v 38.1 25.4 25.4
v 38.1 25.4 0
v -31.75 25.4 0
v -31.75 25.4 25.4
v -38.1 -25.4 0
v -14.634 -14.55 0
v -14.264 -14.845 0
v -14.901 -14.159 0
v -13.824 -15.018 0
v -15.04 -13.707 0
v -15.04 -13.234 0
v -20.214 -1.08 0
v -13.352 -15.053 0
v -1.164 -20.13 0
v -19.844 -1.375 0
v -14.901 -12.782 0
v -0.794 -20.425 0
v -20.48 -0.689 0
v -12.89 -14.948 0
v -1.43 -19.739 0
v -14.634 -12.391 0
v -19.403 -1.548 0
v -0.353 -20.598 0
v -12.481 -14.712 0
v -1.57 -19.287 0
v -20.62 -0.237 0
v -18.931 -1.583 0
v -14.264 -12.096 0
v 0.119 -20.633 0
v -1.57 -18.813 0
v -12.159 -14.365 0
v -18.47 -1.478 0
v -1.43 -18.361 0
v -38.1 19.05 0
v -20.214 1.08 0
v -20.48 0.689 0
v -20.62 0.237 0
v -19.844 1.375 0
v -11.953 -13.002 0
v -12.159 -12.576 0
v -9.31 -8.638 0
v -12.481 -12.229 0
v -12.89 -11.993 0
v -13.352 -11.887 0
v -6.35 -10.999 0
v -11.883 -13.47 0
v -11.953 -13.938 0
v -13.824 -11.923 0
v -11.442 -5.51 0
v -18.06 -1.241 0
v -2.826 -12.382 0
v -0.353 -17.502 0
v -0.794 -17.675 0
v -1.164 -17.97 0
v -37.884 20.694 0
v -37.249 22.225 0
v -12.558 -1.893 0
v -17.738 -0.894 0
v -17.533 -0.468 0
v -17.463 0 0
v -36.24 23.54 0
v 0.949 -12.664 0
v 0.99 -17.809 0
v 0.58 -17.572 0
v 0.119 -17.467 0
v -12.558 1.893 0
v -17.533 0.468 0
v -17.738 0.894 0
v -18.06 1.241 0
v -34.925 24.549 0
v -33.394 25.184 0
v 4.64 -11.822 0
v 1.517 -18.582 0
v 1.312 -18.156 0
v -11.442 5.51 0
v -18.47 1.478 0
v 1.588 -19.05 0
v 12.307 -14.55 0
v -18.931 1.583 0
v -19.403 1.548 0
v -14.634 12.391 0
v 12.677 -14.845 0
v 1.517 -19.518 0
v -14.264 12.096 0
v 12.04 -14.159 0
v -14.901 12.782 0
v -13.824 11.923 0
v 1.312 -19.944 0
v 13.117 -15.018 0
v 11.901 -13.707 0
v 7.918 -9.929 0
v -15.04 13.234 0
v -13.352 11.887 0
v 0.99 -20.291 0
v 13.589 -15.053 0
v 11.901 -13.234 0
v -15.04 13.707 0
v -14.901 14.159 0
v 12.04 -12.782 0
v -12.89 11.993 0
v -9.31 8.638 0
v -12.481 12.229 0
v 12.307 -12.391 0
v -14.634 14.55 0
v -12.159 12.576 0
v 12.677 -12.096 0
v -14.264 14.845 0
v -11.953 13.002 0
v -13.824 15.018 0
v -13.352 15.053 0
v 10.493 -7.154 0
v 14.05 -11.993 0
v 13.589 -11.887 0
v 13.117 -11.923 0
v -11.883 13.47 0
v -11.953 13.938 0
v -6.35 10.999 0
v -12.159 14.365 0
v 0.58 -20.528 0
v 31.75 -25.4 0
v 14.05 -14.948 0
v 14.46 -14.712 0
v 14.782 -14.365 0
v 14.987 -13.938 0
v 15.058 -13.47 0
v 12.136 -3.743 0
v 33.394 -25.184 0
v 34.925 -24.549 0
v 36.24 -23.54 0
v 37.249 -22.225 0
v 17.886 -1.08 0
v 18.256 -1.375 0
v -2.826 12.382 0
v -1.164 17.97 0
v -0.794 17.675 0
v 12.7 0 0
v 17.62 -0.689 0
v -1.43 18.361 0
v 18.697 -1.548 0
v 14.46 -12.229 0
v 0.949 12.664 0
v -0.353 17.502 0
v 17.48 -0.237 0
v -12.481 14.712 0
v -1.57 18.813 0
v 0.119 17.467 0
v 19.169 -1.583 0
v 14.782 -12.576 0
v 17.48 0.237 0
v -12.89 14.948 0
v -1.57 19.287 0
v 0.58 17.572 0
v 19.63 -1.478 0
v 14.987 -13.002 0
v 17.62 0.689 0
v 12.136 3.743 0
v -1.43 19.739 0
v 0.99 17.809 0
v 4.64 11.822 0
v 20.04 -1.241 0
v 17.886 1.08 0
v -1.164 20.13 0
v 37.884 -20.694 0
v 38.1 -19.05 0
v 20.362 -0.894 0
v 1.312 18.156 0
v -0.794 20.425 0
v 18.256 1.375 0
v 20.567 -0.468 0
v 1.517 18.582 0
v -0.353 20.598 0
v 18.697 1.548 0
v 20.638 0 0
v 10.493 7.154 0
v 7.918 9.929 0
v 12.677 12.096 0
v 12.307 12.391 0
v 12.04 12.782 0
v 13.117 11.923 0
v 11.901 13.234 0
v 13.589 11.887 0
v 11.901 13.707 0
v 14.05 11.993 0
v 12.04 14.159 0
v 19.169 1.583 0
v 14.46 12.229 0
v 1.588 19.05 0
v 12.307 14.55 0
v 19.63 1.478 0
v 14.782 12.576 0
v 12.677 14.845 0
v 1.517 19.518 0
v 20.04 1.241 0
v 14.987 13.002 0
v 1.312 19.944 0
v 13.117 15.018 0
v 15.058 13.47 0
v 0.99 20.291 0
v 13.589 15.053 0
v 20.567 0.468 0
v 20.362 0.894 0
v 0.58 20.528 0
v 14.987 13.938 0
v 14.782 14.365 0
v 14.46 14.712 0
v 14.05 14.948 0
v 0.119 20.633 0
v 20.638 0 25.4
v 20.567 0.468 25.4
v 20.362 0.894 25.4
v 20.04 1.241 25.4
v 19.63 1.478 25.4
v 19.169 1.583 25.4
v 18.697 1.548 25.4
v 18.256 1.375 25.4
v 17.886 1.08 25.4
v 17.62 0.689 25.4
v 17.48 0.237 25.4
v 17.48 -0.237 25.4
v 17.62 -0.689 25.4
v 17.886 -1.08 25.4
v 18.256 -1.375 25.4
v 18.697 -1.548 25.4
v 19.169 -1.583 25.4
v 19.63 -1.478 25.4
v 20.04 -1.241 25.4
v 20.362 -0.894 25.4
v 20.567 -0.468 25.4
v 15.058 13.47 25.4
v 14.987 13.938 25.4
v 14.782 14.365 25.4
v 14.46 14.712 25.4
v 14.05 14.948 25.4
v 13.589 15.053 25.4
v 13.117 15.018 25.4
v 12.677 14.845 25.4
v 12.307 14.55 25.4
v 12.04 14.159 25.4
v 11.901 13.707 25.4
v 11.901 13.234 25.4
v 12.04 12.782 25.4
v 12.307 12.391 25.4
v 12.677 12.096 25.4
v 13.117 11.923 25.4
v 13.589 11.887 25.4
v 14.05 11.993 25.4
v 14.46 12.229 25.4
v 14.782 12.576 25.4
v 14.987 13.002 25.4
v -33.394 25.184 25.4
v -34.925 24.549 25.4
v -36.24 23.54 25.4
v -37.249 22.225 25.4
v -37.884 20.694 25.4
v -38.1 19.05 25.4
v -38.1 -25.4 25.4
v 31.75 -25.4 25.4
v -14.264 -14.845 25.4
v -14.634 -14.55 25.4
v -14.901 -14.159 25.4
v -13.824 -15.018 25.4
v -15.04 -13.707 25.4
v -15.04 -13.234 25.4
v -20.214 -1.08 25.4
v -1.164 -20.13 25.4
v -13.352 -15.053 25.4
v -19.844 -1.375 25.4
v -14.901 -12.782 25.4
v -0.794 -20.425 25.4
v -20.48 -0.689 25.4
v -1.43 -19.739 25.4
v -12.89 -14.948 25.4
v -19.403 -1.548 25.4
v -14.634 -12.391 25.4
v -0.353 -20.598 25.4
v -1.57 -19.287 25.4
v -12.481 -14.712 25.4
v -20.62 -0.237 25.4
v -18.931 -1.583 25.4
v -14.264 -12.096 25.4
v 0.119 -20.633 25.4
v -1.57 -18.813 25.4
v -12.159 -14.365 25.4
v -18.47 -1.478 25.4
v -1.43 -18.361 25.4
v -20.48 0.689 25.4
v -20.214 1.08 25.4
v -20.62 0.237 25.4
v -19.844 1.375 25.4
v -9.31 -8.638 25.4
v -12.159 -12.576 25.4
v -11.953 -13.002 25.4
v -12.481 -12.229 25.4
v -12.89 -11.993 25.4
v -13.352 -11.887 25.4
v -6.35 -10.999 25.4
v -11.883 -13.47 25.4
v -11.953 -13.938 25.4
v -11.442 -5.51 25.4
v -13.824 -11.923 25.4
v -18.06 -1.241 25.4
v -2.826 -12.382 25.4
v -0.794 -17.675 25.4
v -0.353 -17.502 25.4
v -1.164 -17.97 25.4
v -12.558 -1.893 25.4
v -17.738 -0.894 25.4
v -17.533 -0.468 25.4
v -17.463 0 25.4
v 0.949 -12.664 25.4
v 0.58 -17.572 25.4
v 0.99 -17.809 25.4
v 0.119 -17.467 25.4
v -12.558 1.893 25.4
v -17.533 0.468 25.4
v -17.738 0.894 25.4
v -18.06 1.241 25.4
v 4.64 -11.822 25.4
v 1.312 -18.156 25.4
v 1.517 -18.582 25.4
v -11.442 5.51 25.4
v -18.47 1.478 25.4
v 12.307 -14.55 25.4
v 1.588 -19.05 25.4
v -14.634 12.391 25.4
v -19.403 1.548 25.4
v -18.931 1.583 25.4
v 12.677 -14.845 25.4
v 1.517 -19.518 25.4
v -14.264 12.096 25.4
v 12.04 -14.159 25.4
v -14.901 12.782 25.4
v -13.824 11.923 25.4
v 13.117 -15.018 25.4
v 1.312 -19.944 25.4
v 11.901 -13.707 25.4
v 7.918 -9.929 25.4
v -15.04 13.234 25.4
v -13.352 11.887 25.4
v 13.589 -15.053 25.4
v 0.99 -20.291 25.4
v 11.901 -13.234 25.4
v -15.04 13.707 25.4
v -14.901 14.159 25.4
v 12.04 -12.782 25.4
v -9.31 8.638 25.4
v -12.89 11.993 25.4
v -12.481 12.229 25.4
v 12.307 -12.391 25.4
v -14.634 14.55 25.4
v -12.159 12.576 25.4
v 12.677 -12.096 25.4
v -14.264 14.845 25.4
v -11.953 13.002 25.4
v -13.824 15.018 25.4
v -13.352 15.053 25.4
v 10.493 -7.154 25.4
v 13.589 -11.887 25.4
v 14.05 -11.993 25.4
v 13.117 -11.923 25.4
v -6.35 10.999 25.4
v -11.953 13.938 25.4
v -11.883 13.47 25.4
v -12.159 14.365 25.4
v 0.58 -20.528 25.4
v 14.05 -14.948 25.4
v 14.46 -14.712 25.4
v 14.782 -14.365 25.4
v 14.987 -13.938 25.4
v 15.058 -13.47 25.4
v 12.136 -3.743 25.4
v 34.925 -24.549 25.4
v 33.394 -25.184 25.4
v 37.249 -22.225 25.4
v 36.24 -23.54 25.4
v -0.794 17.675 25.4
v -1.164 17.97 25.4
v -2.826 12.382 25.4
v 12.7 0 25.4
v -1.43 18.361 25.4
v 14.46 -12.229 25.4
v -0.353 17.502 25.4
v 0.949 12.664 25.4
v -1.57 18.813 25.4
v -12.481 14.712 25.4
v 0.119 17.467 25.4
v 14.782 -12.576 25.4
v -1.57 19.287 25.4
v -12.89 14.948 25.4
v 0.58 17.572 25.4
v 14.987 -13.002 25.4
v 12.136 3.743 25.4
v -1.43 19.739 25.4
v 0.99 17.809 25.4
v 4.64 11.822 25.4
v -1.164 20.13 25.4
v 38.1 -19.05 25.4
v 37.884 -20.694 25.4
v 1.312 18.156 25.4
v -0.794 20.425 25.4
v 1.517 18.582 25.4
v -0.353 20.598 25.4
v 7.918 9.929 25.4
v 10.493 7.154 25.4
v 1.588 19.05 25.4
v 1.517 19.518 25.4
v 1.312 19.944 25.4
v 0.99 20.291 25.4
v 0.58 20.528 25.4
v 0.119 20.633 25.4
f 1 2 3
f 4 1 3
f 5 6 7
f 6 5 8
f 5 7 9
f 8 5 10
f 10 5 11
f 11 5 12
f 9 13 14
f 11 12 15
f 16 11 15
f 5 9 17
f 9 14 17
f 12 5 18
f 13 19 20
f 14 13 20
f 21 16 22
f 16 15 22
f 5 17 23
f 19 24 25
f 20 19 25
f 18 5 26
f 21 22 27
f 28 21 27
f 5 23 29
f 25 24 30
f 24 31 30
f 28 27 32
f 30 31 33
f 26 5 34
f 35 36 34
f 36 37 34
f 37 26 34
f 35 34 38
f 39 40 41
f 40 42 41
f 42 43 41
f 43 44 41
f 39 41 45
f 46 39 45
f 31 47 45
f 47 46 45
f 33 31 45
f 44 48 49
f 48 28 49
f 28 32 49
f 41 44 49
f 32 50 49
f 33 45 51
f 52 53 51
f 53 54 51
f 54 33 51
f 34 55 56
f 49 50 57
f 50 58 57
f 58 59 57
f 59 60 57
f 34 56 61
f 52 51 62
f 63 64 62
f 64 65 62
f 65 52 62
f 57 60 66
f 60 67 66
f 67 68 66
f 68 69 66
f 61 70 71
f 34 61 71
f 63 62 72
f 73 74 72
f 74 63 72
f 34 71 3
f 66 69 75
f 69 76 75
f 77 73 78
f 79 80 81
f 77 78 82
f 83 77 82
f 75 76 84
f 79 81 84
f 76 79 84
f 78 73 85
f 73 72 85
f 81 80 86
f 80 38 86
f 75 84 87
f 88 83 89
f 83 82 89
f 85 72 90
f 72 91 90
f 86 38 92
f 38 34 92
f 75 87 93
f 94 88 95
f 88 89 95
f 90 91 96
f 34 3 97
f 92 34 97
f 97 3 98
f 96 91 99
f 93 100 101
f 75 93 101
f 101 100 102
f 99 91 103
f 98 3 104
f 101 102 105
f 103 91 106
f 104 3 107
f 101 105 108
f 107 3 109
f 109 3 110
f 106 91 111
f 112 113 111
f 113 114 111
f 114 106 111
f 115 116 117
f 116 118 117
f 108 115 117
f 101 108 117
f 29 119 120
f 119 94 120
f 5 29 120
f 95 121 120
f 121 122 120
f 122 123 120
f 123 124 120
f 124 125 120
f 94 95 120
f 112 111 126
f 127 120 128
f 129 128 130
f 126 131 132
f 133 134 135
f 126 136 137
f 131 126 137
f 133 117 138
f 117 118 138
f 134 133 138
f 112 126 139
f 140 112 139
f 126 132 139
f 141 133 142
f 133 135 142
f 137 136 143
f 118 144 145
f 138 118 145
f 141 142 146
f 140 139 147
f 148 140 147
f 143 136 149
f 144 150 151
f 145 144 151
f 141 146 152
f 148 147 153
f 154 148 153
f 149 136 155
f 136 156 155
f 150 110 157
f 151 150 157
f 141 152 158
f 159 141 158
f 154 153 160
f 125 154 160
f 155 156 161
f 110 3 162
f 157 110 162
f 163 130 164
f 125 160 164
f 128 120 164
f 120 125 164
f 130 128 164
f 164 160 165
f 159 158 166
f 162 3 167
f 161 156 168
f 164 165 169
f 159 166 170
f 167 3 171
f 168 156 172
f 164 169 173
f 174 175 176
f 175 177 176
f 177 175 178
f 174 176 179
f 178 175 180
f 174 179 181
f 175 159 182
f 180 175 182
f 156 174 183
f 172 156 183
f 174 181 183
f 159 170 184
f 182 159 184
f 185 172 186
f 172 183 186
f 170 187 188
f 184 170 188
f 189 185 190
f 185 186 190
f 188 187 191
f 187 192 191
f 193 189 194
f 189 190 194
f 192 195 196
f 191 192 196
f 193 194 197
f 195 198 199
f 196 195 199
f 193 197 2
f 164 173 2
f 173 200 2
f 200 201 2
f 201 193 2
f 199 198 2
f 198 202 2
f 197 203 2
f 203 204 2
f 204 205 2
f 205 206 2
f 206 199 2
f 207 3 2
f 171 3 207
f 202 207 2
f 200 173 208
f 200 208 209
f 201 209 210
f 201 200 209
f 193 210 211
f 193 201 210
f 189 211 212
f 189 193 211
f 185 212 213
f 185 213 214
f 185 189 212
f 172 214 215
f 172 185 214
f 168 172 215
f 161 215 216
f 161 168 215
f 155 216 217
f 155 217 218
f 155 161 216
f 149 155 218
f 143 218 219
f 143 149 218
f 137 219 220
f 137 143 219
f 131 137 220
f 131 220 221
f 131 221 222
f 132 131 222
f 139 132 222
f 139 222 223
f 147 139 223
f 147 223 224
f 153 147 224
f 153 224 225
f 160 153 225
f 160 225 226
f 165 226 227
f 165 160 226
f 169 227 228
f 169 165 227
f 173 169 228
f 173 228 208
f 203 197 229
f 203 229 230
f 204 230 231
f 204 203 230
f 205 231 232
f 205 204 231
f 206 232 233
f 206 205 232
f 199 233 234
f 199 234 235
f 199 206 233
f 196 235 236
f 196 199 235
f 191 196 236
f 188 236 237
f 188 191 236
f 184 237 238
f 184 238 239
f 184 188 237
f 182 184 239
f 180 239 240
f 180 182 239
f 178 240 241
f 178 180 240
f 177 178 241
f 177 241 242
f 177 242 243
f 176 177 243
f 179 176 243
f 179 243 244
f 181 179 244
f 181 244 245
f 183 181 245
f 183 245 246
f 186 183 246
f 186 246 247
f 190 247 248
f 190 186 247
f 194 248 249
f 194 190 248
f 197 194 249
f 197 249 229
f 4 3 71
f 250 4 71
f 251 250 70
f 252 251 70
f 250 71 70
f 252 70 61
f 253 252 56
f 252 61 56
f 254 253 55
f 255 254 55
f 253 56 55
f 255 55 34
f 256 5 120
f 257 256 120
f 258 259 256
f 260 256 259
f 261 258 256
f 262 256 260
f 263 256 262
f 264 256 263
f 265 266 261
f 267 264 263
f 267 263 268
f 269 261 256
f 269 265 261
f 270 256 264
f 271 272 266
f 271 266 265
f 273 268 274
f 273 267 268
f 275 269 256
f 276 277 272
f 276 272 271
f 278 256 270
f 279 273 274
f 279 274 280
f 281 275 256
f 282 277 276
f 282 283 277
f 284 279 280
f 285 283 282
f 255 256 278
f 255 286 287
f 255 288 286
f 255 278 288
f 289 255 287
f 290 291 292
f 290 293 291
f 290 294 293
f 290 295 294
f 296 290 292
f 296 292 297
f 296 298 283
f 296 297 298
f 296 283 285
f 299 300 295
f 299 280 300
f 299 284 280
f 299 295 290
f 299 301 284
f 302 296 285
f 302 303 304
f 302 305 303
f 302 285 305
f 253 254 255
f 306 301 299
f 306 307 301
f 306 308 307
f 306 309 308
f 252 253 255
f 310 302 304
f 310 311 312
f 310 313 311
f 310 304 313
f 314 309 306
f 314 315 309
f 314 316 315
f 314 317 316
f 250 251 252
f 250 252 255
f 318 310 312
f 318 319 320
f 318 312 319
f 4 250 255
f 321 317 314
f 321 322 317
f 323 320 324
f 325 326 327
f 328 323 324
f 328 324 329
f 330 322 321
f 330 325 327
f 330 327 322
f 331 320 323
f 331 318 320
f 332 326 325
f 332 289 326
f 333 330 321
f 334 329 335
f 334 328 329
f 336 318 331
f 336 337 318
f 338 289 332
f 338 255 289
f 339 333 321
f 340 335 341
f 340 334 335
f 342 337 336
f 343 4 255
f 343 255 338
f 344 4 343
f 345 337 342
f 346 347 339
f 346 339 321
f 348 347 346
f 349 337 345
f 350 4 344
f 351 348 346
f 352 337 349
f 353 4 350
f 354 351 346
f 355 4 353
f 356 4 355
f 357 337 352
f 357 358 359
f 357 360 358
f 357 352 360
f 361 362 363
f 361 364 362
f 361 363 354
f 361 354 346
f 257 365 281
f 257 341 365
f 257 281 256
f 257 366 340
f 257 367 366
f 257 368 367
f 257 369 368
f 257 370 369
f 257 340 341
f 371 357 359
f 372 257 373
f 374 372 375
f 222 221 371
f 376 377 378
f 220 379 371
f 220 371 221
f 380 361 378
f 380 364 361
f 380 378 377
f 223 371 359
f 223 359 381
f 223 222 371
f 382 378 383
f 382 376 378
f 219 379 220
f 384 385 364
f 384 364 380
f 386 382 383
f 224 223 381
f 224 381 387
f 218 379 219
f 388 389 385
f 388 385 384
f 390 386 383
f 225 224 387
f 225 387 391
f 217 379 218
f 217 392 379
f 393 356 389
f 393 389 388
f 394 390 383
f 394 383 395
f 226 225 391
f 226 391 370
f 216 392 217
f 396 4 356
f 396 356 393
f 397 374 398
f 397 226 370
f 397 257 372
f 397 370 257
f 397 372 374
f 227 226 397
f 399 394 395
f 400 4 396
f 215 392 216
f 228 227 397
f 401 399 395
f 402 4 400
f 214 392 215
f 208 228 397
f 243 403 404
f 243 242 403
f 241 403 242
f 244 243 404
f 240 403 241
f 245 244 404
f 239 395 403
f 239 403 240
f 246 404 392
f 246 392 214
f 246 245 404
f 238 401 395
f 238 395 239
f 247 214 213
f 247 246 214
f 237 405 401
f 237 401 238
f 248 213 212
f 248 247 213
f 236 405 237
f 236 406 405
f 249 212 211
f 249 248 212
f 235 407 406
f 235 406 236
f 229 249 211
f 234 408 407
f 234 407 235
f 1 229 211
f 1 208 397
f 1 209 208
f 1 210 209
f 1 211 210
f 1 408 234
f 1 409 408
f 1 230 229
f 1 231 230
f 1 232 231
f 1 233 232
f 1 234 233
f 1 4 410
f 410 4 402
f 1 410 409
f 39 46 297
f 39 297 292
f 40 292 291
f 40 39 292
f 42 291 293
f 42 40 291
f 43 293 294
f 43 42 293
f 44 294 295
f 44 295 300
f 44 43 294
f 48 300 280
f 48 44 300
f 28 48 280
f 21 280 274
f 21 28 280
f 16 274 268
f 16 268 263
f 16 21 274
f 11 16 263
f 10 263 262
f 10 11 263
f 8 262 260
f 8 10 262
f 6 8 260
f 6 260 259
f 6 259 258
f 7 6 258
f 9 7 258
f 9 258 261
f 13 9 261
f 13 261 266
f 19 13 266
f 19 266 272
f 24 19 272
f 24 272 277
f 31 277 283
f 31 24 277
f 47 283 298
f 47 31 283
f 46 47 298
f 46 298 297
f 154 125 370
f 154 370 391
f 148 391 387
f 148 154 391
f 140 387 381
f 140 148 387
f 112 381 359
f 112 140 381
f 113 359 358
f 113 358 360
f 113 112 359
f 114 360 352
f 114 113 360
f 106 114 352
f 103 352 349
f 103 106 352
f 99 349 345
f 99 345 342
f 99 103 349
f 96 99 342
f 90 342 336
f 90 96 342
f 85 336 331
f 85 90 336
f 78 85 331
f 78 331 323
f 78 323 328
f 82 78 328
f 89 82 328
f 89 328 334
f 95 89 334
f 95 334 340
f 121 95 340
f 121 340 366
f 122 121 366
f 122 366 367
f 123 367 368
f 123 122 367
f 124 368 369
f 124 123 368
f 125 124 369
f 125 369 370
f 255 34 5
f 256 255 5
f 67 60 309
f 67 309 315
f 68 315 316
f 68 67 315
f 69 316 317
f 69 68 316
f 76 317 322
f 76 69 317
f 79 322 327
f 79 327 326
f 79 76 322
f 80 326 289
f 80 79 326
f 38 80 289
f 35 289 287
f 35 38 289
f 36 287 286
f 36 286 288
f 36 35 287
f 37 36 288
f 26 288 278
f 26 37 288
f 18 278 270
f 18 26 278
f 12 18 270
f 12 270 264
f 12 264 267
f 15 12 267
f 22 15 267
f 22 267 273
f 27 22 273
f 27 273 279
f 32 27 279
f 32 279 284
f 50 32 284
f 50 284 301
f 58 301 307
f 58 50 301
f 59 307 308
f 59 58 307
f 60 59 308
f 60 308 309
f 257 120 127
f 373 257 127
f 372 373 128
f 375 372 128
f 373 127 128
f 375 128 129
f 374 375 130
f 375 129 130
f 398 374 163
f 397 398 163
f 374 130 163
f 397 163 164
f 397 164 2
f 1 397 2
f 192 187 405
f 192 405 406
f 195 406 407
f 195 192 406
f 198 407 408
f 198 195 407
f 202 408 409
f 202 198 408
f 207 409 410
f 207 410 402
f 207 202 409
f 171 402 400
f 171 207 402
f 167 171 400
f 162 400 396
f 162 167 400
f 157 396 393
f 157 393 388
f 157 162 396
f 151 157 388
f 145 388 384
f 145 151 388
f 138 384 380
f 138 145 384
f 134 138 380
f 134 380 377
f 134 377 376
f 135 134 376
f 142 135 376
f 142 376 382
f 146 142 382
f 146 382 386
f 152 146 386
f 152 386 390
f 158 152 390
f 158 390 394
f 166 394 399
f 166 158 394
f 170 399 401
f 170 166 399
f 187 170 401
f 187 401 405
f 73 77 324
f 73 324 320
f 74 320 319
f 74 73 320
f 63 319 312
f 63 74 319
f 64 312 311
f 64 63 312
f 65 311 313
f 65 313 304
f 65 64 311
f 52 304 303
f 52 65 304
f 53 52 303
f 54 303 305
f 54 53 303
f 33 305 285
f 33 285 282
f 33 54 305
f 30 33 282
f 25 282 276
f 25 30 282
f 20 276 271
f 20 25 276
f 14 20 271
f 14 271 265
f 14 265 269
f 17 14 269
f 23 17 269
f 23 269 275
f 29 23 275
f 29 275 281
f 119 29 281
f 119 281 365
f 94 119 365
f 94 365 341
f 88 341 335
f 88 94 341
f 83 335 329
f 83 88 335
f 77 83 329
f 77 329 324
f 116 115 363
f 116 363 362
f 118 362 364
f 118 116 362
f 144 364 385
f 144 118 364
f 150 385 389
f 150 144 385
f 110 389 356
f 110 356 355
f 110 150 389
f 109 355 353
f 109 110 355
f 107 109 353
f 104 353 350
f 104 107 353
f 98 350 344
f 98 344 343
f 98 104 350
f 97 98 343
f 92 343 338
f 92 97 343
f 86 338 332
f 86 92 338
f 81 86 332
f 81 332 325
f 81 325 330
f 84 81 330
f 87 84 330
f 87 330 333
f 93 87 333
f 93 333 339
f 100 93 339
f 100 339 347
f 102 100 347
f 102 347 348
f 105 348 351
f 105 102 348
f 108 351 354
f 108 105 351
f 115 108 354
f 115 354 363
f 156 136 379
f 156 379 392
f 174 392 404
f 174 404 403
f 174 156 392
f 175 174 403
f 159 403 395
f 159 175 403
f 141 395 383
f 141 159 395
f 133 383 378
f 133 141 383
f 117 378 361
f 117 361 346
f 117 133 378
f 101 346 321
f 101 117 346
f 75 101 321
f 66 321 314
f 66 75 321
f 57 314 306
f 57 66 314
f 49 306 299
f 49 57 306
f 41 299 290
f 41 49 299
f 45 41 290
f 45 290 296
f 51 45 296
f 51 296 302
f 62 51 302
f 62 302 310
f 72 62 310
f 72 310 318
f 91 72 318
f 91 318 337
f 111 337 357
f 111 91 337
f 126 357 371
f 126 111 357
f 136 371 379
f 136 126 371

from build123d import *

# Parameters (mm, degrees)
F0_R     = 1.5875
F0_R_2   = 12.7
F1_DEPTH = 25.4


with BuildPart() as f1:
    # F0 (on Top) → F1 (new body)
    with BuildSketch(Plane.XY):
        with BuildLine():
            Line((38.1, -19.05), (38.1, 25.4))
            Line((38.1, 25.4), (-31.75, 25.4))
            ThreePointArc((-31.75, 25.4), (-36.240128, 23.540128), (-38.1, 19.05))
            Line((-38.1, 19.05), (-38.1, -25.4))
            Line((-38.1, -25.4), (31.75, -25.4))
            ThreePointArc((31.75, -25.4), (36.240128, -23.540128), (38.1, -19.05))
        make_face()
        with Locations((-13.470384, -13.470384)):
            Circle(F0_R, mode=Mode.SUBTRACT)
        with Locations((0, -19.05)):
            Circle(F0_R, mode=Mode.SUBTRACT)
        with Locations((-19.05, 0)):
            Circle(F0_R, mode=Mode.SUBTRACT)
        Circle(F0_R_2, mode=Mode.SUBTRACT)
        with Locations((13.470384, -13.470384)):
            Circle(F0_R, mode=Mode.SUBTRACT)
        with Locations((19.05, 0)):
            Circle(F0_R, mode=Mode.SUBTRACT)
        with Locations((-13.470384, 13.470384)):
            Circle(F0_R, mode=Mode.SUBTRACT)
        with Locations((0, 19.05)):
            Circle(F0_R, mode=Mode.SUBTRACT)
        with Locations((13.470384, 13.470384)):
            Circle(F0_R, mode=Mode.SUBTRACT)
    extrude(amount=F1_DEPTH)


solid = f1.part
